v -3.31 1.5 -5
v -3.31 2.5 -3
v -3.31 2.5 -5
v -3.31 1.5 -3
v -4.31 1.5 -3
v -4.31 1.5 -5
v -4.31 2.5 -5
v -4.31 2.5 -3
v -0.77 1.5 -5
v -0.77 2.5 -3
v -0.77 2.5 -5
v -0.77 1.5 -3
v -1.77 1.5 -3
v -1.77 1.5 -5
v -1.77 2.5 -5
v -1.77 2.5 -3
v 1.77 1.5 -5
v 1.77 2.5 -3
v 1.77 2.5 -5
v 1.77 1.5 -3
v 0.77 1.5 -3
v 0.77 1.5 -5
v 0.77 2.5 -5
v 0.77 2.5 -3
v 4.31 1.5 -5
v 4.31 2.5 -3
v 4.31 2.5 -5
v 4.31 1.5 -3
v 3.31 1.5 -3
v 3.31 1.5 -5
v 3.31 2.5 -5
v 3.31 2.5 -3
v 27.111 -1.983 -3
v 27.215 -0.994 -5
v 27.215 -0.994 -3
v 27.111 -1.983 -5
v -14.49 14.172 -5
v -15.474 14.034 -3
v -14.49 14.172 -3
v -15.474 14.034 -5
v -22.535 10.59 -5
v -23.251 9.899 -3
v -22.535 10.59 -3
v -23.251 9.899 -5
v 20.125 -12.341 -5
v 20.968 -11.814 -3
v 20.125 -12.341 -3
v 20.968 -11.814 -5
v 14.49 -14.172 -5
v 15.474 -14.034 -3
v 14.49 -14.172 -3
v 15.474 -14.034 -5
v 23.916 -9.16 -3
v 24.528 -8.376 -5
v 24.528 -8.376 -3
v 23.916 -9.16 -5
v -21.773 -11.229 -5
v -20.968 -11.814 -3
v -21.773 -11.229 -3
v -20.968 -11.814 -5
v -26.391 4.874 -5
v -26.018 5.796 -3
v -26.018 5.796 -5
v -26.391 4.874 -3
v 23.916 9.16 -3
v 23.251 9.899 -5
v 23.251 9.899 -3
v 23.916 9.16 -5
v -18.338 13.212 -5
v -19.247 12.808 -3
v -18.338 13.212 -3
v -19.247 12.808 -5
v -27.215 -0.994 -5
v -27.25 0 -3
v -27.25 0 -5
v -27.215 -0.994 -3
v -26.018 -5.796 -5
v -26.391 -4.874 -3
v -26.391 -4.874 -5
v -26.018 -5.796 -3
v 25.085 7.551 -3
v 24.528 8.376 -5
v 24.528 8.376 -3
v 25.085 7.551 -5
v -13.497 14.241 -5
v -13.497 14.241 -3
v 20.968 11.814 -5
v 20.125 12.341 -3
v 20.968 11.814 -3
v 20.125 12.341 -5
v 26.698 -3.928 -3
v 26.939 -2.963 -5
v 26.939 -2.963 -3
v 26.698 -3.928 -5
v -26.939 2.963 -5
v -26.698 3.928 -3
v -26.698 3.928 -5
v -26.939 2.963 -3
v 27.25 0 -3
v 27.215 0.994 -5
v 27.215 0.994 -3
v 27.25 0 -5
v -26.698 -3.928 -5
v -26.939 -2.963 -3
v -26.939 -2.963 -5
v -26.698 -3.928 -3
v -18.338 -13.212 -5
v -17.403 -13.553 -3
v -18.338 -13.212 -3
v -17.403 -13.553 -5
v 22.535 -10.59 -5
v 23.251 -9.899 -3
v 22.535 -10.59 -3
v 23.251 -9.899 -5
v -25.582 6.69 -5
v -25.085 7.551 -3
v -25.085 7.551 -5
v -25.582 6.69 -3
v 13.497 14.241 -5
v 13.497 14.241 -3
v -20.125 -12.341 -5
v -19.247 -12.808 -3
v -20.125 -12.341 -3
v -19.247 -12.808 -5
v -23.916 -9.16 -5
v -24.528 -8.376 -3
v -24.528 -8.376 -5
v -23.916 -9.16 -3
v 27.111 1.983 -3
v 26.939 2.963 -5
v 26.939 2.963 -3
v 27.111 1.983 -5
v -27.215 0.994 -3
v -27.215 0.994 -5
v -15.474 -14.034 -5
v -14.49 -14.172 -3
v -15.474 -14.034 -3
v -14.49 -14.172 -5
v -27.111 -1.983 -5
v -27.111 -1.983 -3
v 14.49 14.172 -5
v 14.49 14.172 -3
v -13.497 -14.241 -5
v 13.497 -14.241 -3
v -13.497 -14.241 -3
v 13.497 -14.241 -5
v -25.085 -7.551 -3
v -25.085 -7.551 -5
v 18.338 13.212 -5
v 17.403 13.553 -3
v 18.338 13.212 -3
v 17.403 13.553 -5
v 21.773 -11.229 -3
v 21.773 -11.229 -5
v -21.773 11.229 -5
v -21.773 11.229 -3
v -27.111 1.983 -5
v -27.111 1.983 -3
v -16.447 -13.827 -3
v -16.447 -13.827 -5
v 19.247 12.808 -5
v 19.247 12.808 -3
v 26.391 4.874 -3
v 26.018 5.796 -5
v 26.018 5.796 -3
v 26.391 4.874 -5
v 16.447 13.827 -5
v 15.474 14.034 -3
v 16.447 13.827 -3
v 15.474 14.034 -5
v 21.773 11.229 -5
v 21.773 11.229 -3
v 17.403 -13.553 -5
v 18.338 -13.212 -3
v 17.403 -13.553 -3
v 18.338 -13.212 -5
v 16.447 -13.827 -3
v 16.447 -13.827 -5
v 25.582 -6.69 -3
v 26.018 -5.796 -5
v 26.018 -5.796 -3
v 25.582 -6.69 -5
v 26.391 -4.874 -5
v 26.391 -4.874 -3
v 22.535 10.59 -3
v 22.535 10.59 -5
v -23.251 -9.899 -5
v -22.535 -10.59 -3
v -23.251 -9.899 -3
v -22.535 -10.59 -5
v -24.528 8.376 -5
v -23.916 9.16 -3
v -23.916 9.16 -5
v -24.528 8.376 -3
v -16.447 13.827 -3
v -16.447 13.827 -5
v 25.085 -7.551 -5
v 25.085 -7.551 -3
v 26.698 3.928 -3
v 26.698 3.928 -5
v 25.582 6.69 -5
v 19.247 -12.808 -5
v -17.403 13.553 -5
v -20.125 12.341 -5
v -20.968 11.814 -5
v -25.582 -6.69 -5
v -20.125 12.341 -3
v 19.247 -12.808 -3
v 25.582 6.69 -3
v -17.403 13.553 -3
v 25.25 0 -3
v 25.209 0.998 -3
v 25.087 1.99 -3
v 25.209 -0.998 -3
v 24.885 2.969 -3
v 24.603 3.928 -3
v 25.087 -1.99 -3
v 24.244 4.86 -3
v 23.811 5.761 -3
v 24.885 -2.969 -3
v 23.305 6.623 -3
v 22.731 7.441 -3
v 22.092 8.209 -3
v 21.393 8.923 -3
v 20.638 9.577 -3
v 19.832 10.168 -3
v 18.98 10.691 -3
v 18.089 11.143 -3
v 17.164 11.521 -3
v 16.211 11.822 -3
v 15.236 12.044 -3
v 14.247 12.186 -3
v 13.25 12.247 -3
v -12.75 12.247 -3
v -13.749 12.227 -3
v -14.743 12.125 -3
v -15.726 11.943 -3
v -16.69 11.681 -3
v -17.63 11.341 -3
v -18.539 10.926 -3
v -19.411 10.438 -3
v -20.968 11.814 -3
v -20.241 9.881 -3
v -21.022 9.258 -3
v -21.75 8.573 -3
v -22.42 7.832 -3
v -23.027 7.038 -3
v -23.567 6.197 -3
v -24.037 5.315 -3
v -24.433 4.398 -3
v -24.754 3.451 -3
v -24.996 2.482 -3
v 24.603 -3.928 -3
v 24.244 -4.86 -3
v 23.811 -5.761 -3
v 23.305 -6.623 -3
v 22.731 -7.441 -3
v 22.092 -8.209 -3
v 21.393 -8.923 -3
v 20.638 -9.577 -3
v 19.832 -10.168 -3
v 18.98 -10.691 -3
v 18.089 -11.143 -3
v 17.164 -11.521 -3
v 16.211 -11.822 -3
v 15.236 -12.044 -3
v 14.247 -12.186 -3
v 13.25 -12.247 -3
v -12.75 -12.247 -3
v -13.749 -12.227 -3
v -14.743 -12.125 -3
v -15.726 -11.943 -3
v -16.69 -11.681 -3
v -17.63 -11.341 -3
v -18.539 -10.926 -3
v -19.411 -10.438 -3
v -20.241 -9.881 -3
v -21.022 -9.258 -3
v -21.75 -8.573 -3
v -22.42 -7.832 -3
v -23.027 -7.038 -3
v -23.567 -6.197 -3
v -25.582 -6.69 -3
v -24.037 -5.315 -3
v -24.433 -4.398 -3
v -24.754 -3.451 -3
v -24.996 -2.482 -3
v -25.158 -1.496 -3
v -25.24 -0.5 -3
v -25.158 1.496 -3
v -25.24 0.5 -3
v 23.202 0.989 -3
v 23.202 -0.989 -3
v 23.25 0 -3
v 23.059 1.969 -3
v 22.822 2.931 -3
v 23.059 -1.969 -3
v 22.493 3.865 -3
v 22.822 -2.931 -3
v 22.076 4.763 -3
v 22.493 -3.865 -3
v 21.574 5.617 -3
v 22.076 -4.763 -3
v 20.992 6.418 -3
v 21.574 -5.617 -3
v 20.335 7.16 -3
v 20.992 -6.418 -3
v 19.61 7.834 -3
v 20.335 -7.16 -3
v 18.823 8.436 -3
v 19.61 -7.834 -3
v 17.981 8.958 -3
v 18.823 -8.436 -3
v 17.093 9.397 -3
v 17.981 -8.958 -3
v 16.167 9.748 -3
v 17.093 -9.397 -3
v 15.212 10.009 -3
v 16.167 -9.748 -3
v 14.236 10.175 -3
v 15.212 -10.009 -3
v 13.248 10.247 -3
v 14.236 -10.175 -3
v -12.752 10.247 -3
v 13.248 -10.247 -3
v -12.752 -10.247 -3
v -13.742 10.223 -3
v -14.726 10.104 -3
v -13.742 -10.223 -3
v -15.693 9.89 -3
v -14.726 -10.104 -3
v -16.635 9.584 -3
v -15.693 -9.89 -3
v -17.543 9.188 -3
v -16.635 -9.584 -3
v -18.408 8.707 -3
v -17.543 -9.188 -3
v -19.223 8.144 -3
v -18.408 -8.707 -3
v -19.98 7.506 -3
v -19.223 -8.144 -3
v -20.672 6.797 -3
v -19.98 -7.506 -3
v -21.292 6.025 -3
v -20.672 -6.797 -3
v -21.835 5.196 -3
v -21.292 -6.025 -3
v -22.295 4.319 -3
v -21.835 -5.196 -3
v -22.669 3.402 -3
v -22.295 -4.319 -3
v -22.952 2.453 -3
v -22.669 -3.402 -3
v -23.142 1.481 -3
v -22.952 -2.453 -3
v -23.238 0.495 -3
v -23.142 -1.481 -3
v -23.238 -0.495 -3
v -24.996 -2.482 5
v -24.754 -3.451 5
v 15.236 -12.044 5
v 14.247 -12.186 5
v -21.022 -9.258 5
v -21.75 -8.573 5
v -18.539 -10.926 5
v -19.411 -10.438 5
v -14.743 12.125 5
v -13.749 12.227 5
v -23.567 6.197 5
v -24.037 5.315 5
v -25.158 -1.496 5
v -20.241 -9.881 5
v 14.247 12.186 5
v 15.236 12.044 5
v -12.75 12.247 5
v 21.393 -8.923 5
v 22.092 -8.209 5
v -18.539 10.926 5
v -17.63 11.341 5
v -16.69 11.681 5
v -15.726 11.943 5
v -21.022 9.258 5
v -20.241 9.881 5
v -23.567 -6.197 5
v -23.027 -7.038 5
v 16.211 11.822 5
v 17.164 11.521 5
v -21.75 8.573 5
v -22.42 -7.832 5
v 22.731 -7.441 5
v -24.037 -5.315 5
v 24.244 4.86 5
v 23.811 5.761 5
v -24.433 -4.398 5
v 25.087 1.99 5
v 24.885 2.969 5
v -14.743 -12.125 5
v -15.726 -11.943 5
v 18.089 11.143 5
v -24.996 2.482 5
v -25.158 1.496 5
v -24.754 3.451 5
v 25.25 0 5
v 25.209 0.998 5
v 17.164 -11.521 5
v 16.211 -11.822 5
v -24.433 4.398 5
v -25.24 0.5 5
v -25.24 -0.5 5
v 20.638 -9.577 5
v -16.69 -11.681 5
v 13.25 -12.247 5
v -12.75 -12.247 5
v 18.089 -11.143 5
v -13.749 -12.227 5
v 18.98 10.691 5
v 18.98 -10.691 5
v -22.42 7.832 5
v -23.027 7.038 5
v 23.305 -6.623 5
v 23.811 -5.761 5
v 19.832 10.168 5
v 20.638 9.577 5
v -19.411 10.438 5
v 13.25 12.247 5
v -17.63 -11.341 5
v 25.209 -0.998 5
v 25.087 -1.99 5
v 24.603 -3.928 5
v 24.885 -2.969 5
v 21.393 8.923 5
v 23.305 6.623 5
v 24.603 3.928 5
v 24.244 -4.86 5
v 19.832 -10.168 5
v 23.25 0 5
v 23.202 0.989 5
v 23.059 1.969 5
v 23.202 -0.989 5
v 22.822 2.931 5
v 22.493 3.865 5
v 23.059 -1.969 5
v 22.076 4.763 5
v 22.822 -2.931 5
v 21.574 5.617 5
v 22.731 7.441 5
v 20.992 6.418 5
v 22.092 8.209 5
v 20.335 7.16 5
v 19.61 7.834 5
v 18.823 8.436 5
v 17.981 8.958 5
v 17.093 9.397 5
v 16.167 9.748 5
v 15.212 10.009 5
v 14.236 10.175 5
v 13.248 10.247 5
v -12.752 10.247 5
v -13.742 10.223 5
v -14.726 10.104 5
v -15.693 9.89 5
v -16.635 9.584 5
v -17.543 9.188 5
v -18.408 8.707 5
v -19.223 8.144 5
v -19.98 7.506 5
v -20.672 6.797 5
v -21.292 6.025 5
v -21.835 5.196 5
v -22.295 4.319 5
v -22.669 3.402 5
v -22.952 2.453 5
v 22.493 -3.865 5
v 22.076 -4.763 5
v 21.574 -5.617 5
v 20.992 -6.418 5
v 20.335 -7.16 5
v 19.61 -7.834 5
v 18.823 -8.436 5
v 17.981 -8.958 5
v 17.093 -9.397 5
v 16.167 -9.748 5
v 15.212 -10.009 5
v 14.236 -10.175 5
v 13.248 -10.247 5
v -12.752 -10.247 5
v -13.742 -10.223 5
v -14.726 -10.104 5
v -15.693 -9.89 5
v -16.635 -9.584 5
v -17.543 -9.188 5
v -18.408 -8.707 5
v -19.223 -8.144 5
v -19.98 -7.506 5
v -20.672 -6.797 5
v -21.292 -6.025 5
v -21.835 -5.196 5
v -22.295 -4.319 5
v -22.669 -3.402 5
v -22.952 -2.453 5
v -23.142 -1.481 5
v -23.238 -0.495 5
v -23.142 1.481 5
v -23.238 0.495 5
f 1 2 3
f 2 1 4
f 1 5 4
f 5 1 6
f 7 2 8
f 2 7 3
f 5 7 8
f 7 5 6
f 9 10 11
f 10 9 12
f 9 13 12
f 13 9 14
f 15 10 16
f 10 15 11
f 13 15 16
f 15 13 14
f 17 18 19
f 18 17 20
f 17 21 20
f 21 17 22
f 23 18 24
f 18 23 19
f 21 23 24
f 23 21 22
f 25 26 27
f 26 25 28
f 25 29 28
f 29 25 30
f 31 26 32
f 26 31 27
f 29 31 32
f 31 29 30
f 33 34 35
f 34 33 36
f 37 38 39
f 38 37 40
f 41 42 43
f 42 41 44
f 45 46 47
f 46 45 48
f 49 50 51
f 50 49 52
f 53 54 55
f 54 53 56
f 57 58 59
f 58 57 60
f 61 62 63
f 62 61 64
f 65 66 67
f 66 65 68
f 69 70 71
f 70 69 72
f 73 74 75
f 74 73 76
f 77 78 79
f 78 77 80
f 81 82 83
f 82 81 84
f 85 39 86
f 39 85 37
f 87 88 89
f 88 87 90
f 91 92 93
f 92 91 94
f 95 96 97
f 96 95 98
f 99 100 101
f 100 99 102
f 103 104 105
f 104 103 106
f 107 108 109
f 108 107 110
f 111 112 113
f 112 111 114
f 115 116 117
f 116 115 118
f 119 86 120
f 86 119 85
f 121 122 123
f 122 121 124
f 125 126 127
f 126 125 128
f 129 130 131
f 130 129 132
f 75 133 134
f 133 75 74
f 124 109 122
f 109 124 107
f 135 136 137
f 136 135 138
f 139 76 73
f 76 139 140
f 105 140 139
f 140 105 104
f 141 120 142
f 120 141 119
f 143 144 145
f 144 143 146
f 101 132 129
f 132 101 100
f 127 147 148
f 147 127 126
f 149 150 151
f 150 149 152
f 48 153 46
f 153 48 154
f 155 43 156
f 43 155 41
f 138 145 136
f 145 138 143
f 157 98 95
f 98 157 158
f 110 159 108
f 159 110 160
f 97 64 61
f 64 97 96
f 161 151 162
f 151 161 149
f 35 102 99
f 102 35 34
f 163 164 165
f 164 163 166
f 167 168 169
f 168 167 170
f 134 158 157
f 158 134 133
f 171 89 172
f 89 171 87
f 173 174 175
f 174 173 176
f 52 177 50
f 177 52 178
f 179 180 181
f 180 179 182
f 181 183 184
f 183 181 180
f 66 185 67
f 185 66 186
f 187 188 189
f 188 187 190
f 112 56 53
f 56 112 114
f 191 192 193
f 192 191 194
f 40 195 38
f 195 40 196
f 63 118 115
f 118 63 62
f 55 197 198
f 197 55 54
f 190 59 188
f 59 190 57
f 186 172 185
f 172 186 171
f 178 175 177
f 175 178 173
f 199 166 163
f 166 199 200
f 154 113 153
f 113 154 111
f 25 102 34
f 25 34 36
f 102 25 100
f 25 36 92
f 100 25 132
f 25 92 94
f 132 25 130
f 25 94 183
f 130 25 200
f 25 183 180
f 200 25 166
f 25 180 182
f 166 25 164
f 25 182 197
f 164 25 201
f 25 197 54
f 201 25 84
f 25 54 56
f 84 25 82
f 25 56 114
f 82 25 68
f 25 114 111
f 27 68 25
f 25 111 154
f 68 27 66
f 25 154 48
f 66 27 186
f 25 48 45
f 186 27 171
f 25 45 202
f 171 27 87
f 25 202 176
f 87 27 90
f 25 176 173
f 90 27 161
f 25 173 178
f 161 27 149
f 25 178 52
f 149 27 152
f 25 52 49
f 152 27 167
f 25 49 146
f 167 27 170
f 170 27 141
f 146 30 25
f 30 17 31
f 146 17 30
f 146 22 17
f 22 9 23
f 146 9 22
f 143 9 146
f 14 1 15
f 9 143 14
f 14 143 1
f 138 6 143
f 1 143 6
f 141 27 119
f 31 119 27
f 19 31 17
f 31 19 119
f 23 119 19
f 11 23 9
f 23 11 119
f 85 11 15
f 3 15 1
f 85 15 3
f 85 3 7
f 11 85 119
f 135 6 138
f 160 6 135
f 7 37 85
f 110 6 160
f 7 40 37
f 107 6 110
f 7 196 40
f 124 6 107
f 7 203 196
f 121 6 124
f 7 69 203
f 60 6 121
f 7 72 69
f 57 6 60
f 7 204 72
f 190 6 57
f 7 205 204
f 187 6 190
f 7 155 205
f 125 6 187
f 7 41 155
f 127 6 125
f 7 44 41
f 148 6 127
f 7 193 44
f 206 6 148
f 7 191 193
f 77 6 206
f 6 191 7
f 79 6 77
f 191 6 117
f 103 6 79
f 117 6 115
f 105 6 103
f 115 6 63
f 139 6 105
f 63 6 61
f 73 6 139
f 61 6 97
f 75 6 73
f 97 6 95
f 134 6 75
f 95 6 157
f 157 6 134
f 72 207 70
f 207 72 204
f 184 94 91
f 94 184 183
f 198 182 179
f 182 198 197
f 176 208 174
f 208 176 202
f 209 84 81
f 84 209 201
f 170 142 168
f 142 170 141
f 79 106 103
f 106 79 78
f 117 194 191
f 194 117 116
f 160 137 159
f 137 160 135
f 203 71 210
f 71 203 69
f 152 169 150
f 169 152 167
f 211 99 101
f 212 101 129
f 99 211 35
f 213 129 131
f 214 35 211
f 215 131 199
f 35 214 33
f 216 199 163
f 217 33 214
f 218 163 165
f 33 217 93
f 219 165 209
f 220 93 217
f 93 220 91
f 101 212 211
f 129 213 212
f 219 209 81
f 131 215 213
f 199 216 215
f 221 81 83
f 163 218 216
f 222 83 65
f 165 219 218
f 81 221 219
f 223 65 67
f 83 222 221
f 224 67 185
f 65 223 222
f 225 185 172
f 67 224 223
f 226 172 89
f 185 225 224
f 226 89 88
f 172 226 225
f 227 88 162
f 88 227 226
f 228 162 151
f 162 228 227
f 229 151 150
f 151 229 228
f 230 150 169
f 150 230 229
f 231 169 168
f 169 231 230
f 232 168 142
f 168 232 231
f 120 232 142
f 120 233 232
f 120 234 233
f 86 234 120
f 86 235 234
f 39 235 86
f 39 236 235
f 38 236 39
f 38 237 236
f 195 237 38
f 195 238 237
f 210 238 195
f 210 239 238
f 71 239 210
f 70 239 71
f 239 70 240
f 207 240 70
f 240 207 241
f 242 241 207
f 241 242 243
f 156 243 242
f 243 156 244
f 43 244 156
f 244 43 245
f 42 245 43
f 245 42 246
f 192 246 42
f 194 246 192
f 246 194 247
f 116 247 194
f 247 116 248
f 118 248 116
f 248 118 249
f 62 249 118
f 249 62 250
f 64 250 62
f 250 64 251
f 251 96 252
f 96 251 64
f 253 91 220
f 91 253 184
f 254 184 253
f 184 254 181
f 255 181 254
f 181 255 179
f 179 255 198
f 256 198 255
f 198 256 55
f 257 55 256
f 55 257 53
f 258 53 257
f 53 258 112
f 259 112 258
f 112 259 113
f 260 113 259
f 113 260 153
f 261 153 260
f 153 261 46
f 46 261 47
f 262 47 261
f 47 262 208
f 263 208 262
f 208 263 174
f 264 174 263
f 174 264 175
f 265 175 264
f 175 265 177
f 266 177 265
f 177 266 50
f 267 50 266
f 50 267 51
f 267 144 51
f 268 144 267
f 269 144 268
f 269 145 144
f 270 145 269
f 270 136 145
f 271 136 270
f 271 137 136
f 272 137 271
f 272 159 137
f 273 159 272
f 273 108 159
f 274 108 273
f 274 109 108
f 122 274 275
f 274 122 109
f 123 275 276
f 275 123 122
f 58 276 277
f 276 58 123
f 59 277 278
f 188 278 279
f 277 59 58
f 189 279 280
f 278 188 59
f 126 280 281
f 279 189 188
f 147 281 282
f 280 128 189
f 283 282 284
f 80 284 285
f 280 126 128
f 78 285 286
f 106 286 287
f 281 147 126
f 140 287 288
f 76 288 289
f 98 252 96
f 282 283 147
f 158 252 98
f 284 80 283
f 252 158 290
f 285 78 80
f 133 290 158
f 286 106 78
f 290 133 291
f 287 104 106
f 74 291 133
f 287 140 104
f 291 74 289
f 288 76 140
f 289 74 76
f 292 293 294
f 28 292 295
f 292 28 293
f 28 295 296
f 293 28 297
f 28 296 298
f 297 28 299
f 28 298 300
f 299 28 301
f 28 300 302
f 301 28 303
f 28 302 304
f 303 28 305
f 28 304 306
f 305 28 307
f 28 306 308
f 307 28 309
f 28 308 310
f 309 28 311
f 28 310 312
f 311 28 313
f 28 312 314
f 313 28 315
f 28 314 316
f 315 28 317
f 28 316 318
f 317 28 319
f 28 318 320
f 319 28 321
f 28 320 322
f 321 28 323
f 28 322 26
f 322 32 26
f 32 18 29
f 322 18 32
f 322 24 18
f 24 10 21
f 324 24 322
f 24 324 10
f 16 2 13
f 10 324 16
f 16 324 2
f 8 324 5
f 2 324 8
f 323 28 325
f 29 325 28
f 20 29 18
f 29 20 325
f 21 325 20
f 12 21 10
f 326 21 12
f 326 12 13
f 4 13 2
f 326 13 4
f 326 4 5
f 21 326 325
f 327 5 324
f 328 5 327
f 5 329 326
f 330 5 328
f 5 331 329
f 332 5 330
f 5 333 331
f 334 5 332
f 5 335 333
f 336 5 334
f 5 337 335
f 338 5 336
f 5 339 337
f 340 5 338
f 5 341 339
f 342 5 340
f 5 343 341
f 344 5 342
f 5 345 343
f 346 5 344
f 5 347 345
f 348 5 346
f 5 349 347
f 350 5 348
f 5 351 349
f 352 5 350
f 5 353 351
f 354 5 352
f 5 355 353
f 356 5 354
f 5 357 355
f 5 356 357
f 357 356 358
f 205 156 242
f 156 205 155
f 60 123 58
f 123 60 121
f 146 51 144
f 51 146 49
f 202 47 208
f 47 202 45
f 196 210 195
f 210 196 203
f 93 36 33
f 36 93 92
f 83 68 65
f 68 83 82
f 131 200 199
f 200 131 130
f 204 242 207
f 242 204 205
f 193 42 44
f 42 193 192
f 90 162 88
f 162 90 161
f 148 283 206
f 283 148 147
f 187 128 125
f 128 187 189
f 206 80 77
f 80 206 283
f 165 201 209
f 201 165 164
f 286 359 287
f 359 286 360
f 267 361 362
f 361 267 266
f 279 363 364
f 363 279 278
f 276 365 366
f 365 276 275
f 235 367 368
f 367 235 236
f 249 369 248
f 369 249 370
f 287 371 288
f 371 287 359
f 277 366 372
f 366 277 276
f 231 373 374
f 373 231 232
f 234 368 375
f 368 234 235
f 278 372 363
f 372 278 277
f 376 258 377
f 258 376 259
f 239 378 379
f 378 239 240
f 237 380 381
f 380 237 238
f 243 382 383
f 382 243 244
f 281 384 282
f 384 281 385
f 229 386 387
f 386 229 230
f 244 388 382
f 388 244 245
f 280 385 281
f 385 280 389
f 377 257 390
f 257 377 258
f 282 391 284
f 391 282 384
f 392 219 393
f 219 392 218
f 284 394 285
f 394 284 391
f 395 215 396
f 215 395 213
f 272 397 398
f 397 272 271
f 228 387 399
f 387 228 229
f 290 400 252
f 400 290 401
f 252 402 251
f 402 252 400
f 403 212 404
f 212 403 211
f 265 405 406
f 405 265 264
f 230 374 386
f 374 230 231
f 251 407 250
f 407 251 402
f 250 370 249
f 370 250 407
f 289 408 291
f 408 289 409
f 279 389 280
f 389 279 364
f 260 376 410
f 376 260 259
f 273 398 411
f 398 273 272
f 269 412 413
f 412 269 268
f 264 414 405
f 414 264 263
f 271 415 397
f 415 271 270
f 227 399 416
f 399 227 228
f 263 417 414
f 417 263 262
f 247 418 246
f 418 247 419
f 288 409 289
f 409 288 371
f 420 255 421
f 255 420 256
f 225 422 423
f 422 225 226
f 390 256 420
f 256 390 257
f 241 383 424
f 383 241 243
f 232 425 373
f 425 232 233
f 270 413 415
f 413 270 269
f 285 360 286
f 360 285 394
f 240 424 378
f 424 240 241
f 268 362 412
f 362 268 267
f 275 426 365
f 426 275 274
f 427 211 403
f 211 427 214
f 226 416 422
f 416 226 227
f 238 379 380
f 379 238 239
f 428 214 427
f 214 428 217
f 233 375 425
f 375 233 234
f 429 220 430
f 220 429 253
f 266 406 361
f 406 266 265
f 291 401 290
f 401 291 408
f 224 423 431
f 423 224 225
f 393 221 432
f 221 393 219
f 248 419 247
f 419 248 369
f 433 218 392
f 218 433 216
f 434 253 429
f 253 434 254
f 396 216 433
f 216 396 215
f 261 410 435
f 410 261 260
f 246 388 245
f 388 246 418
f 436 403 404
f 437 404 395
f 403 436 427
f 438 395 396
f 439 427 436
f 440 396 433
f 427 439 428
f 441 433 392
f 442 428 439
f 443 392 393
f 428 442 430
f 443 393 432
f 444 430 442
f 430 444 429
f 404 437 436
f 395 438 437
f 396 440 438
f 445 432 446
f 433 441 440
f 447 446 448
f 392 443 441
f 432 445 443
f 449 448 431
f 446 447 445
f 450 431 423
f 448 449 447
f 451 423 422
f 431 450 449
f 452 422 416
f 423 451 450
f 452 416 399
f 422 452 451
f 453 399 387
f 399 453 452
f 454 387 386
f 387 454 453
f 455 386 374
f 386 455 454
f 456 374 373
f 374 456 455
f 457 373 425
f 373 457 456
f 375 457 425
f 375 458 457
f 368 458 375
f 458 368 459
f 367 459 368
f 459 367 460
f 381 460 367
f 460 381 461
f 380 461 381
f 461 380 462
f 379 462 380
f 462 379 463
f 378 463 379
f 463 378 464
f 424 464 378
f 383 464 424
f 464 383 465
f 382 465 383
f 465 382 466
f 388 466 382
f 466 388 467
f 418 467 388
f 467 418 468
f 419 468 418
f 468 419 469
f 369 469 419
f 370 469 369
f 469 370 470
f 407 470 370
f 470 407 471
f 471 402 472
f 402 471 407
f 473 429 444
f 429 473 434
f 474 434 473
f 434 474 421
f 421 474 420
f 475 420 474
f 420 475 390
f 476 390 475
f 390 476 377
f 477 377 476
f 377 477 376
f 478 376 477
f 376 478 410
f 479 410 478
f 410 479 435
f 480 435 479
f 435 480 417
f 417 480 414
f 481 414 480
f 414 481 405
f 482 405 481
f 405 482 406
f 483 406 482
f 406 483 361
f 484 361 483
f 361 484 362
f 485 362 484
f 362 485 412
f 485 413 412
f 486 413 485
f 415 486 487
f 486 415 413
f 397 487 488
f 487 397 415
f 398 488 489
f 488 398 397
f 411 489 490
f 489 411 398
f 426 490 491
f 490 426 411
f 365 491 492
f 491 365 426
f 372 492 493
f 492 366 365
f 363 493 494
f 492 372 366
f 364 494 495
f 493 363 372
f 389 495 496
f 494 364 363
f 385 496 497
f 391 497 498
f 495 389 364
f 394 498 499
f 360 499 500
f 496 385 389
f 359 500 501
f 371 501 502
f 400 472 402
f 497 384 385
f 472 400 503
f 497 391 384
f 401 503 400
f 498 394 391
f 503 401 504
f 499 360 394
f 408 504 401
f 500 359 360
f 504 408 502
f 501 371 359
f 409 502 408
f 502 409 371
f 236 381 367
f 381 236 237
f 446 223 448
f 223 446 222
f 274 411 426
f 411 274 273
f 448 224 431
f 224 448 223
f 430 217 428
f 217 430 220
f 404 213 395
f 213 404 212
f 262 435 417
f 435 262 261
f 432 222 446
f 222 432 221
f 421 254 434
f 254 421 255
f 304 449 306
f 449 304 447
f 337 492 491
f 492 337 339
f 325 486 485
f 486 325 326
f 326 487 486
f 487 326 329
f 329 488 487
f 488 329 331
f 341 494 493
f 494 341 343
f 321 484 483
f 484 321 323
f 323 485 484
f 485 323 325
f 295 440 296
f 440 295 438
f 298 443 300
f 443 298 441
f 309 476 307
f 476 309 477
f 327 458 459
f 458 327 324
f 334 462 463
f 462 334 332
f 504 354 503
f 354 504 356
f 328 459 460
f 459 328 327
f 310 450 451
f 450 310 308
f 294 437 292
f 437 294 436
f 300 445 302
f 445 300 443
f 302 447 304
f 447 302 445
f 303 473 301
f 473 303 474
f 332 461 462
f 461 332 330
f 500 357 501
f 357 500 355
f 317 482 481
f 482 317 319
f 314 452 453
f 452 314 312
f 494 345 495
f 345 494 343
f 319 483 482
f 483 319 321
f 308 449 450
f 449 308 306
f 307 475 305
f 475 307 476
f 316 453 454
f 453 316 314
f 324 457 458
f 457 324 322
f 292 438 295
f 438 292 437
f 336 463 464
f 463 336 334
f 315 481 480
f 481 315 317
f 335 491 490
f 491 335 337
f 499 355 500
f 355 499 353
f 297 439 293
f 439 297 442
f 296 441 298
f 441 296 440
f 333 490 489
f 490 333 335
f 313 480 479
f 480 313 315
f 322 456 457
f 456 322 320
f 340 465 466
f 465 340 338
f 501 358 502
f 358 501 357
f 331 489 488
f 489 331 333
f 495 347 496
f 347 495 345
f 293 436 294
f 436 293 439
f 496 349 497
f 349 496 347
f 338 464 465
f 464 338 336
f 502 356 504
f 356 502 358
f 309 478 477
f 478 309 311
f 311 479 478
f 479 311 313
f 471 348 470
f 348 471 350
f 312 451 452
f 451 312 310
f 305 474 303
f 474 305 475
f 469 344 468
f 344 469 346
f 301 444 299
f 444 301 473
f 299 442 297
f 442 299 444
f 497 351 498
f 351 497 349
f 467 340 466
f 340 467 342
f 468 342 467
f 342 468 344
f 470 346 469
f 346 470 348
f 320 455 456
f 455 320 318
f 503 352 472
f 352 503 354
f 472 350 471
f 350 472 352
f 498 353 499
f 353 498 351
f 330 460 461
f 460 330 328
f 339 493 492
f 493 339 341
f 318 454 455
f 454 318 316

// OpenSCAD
// file: lib.scad
// Control
preview = true;
testing = false;

$fs = preview ? 1 : 0.05;
$fa = preview ? 1 : 0.2;

wall = 2;
dupont = 2.54;

koppla_width = 50.5;
koppla_diameter = 24.5;
case_width = koppla_width + wall*2;
case_diameter = koppla_diameter + wall*2;
payload_width = koppla_width - wall*2; 
payload_diameter = koppla_diameter - wall*2;

euplug_width = 35.3;
euplug_diameter = 13.7;

lid_height = 10;

h_relay = 0;
h_board = 34;
h_buffer_top = 25;
h_buffer_bottom = 15;
h_buffer = h_buffer_top + h_buffer_bottom;
h_overlap = euplug_width*0.75;

enabled_pylons = [2, 20];

case_height = lid_height+h_buffer+h_relay+h_board+h_overlap+wall*2;

module Block(w, h, d) {
    hull() {
        for(x=[-1,1])
            translate([(w-d)/2*x,0,0])
                cylinder(h=h, r=d/2, center=true);
    }
}
// main file
include <lib.scad>


module DHT22PinHoles(interior_y) {
    for(x=[-1.5,-0.5,0.5,1.5])
        translate([x*dupont, interior_y/2, 0])
            cube([1, wall*2, 1], center=true);
}

union() {
    difference() {
        translate([0, 0, -(lid_height-wall)/2])
            Block(case_width, wall, case_diameter);
        translate([0, wall, -(lid_height-wall)])
            rotate([90,0,0])
                DHT22PinHoles(lid_height-wall);
    }
    difference() {
        Block(koppla_width, lid_height, koppla_diameter);
        Block(payload_width, lid_height+wall, payload_diameter);
    }
}
